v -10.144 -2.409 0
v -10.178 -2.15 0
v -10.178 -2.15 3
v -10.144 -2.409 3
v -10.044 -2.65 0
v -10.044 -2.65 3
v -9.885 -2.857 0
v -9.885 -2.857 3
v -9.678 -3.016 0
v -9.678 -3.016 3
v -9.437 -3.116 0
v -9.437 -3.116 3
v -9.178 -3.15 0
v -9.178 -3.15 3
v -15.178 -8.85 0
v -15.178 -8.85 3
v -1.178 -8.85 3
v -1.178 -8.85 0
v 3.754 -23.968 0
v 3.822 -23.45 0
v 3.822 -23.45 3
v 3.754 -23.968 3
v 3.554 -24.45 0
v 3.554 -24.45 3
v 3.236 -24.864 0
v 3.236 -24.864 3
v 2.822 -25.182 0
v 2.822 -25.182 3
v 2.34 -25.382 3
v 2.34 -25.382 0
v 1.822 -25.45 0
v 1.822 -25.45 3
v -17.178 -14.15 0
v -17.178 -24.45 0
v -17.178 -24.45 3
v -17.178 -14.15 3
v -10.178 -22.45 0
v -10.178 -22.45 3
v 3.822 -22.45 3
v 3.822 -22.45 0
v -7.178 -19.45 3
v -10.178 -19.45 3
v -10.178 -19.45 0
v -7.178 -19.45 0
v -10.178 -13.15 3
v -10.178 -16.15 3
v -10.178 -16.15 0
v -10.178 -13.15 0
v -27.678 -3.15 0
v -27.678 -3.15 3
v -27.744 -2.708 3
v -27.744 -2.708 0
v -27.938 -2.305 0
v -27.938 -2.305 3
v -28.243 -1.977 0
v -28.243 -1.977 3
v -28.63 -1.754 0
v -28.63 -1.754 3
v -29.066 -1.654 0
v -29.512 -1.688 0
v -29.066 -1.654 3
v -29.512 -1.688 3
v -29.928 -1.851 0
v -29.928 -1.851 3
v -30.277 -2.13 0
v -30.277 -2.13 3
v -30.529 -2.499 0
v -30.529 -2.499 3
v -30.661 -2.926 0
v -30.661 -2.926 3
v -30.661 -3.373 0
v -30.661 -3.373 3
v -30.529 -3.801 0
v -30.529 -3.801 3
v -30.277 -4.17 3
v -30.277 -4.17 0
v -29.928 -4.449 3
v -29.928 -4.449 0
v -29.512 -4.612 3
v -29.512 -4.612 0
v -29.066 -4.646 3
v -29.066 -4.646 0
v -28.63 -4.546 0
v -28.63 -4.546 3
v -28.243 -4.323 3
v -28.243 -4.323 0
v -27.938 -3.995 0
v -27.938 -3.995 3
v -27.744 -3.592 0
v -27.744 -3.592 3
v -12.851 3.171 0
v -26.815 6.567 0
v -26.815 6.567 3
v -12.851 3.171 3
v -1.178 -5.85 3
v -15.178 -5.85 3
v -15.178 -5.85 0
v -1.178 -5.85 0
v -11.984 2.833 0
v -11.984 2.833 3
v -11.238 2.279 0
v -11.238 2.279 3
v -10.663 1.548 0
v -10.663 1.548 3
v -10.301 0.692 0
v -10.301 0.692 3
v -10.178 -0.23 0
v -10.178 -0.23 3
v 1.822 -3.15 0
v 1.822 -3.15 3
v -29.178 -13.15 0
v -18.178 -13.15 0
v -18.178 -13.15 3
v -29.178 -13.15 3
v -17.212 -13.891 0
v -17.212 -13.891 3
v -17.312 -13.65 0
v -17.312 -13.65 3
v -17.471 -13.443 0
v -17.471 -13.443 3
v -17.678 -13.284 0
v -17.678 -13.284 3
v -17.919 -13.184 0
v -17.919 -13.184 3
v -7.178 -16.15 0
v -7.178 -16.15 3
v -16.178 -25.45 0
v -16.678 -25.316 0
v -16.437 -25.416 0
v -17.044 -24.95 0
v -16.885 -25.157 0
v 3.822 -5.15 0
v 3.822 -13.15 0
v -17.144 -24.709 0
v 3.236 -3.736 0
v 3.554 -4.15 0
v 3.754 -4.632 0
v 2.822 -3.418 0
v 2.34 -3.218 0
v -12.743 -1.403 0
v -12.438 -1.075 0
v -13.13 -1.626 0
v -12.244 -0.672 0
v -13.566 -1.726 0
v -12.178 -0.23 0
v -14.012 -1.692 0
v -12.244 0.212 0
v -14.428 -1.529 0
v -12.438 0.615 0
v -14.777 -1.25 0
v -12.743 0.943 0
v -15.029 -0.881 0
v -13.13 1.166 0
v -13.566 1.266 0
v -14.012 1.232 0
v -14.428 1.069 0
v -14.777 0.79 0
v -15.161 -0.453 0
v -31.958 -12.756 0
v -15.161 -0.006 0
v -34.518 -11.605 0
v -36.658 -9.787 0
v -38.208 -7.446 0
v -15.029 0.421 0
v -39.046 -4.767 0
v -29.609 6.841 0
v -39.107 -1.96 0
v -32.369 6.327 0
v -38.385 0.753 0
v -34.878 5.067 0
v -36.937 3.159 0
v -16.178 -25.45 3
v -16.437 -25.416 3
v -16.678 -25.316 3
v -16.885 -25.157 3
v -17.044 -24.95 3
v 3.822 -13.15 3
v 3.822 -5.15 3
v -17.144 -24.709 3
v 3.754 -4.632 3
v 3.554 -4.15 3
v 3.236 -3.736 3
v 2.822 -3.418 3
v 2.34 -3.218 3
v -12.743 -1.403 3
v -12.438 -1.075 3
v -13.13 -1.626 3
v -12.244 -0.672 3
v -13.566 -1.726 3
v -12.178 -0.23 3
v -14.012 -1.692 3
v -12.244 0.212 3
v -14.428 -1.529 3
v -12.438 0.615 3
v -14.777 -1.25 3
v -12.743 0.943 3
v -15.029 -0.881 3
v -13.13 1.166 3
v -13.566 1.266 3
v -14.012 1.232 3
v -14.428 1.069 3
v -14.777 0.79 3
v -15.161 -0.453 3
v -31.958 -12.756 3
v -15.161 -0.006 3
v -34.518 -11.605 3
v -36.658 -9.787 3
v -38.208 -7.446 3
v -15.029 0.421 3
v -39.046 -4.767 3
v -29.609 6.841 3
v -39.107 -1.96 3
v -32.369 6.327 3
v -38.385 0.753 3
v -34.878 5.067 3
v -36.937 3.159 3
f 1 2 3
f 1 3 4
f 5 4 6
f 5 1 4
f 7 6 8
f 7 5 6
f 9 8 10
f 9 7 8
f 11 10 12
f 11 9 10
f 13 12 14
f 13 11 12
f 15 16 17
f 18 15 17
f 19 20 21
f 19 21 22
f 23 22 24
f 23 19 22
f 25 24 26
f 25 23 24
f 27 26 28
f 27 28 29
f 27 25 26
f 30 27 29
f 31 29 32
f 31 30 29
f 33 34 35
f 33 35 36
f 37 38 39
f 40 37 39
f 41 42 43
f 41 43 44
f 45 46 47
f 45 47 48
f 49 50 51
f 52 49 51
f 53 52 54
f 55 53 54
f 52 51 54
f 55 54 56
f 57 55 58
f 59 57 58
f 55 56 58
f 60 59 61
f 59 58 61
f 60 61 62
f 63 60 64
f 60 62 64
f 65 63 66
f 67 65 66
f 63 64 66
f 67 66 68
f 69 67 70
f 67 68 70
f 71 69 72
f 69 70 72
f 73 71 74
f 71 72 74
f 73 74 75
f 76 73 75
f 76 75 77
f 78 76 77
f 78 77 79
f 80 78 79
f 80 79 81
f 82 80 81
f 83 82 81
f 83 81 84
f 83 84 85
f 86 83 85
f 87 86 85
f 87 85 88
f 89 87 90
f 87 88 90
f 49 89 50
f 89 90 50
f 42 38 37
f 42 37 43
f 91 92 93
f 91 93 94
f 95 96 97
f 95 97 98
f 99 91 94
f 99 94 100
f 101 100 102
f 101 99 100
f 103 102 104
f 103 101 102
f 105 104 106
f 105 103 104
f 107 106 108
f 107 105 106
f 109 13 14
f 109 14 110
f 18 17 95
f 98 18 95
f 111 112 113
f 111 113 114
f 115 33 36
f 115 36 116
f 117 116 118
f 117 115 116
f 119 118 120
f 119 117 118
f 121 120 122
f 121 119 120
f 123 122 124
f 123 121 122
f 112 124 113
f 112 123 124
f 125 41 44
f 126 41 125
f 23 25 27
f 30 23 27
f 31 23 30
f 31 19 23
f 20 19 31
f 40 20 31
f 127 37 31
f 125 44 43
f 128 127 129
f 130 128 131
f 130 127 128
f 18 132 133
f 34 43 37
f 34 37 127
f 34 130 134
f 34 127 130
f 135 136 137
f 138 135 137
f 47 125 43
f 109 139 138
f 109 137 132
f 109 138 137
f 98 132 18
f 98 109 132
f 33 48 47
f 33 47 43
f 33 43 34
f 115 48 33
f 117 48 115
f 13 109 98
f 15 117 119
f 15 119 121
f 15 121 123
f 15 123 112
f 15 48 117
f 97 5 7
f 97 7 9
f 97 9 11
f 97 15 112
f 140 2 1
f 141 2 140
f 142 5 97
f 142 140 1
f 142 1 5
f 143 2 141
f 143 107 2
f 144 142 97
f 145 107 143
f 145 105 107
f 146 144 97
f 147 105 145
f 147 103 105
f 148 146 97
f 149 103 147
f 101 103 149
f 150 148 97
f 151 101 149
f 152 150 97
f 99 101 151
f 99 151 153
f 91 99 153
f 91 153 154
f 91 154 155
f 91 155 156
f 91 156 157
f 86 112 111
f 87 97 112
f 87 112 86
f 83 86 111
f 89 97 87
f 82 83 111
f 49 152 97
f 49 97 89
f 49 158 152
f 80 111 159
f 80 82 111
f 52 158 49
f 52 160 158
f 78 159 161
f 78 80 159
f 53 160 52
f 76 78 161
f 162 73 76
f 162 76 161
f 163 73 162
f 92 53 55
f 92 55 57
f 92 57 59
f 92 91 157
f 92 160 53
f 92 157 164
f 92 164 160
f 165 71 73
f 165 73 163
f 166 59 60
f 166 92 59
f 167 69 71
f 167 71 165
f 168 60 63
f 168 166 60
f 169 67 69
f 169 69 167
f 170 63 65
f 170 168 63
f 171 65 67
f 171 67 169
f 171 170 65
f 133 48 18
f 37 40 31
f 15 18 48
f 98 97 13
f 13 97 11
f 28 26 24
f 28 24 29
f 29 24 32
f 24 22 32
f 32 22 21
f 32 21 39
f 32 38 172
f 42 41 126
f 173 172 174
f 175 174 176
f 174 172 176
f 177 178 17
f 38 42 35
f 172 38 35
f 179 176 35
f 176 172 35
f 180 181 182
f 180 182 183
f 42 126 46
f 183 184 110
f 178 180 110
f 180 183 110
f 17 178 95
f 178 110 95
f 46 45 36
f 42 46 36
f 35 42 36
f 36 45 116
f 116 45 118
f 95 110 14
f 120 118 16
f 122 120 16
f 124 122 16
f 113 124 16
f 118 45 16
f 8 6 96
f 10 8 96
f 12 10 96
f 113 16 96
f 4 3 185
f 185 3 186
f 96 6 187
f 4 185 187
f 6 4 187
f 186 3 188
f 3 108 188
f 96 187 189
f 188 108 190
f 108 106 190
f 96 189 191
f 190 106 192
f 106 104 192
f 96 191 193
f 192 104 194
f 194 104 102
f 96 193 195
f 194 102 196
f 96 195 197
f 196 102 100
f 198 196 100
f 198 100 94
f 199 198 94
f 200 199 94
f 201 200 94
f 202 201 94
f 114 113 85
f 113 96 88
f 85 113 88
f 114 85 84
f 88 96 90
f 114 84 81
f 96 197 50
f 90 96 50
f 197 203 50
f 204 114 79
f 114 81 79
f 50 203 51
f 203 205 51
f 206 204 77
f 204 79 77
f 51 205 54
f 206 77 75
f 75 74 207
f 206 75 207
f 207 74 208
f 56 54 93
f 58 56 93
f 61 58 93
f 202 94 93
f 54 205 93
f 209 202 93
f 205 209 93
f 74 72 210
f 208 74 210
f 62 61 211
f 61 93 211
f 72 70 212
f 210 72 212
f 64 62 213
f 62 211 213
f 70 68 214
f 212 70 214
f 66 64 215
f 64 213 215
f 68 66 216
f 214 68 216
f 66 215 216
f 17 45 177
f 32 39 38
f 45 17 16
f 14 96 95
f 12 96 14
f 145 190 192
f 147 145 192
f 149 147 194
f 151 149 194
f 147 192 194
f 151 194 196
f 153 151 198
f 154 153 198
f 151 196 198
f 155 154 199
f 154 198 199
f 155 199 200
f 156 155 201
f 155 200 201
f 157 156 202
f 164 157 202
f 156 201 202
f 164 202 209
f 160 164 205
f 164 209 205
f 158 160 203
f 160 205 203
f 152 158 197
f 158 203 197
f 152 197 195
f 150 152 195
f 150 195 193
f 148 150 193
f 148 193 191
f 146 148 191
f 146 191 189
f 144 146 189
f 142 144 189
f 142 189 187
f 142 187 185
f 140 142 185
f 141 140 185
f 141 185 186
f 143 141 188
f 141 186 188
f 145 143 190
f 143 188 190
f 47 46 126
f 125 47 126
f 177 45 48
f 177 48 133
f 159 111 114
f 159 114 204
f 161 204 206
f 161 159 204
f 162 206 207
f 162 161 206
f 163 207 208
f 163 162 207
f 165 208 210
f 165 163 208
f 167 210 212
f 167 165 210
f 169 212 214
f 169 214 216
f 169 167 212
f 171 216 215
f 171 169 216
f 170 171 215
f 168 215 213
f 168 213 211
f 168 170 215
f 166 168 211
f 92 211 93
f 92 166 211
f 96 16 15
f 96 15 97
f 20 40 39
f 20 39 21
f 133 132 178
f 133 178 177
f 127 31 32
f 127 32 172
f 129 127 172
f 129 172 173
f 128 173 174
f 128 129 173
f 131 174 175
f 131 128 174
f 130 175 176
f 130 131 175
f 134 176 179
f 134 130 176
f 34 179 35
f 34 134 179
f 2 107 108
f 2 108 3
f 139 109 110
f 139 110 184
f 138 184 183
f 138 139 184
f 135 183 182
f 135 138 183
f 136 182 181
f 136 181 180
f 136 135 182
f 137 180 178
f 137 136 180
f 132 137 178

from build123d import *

# Parameters (mm, degrees)
BOSS_EXTRUDE1_DEPTH = 3
SKETCH2_R           = 1.5
CUT_EXTRUDE1_DEPTH  = 3
SKETCH3_W           = 14
SKETCH3_H           = 3
CUT_EXTRUDE2_DEPTH  = 3
SKETCH6_R           = 1.5
CUT_EXTRUDE5_DEPTH  = 3
SKETCH7_W           = 11
SKETCH7_H           = 3.3
CUT_EXTRUDE6_DEPTH  = 3


with BuildPart() as part:
    # Sketch1 → Boss-Extrude1 (new body)
    with BuildSketch(Plane.XY):
        with BuildLine():
            Line((3.822175283, -5.149900319), (3.822175283, -23.449900319))
            ThreePointArc((3.822175283, -23.449900319), (3.236388845, -24.864113882), (1.822175283, -25.449900319))
            Line((1.822175283, -25.449900319), (-16.177824717, -25.449900319))
            ThreePointArc((-16.177824717, -25.449900319), (-16.884931499, -25.157007101), (-17.177824717, -24.449900319))
            Line((-17.177824717, -24.449900319), (-17.177824717, -14.149900319))
            ThreePointArc((-17.177824717, -14.149900319), (-17.470717936, -13.442793538), (-18.177824717, -13.149900319))
            Line((-18.177824717, -13.149900319), (-29.177824717, -13.149900319))
            ThreePointArc((-29.177824717, -13.149900319), (-39.106770847, -1.959930257), (-26.814794989, 6.566893931))
            Line((-26.814794989, 6.566893931), (-12.850764313, 3.170977668))
            ThreePointArc((-12.850764313, 3.170977668), (-10.926033354, 1.932885914), (-10.177824717, -0.229900319))
            Line((-10.177824717, -0.229900319), (-10.177824717, -2.149900319))
            ThreePointArc((-10.177824717, -2.149900319), (-9.884931499, -2.857007101), (-9.177824717, -3.149900319))
            Line((-9.177824717, -3.149900319), (1.822175283, -3.149900319))
            ThreePointArc((1.822175283, -3.149900319), (3.236388845, -3.735686757), (3.822175283, -5.149900319))
        make_face()
    extrude(amount=BOSS_EXTRUDE1_DEPTH)

    # Sketch2 → Cut-Extrude1 (cut)
    with BuildSketch(Plane.XY.offset(3)):
        with Locations((-29.177824717, -3.149900319)):
            Circle(SKETCH2_R)
    extrude(amount=-CUT_EXTRUDE1_DEPTH, mode=Mode.SUBTRACT)

    # Sketch3 → Cut-Extrude2 (cut)
    with BuildSketch(Plane.XY.offset(3)):
        with Locations((-8.177824717, -7.349900319)):
            Rectangle(SKETCH3_W, SKETCH3_H)
        with Locations((-3.177824717, -14.649900319)):
            Rectangle(SKETCH3_W, SKETCH3_H)
        with Locations((-3.177824717, -20.949900319)):
            Rectangle(SKETCH3_W, SKETCH3_H)
    extrude(amount=-CUT_EXTRUDE2_DEPTH, mode=Mode.SUBTRACT)

    # Sketch6 → Cut-Extrude5 (cut)
    with BuildSketch(Plane.XY.offset(3)):
        with Locations((-13.677824717, -0.229900319)):
            Circle(SKETCH6_R)
    extrude(amount=-CUT_EXTRUDE5_DEPTH, mode=Mode.SUBTRACT)

    # Sketch7 → Cut-Extrude6 (cut)
    with BuildSketch(Plane.XY.offset(3)):
        with Locations((-1.677824717, -17.799900319)):
            Rectangle(SKETCH7_W, SKETCH7_H)
    extrude(amount=-CUT_EXTRUDE6_DEPTH, mode=Mode.SUBTRACT)


solid = part.part
